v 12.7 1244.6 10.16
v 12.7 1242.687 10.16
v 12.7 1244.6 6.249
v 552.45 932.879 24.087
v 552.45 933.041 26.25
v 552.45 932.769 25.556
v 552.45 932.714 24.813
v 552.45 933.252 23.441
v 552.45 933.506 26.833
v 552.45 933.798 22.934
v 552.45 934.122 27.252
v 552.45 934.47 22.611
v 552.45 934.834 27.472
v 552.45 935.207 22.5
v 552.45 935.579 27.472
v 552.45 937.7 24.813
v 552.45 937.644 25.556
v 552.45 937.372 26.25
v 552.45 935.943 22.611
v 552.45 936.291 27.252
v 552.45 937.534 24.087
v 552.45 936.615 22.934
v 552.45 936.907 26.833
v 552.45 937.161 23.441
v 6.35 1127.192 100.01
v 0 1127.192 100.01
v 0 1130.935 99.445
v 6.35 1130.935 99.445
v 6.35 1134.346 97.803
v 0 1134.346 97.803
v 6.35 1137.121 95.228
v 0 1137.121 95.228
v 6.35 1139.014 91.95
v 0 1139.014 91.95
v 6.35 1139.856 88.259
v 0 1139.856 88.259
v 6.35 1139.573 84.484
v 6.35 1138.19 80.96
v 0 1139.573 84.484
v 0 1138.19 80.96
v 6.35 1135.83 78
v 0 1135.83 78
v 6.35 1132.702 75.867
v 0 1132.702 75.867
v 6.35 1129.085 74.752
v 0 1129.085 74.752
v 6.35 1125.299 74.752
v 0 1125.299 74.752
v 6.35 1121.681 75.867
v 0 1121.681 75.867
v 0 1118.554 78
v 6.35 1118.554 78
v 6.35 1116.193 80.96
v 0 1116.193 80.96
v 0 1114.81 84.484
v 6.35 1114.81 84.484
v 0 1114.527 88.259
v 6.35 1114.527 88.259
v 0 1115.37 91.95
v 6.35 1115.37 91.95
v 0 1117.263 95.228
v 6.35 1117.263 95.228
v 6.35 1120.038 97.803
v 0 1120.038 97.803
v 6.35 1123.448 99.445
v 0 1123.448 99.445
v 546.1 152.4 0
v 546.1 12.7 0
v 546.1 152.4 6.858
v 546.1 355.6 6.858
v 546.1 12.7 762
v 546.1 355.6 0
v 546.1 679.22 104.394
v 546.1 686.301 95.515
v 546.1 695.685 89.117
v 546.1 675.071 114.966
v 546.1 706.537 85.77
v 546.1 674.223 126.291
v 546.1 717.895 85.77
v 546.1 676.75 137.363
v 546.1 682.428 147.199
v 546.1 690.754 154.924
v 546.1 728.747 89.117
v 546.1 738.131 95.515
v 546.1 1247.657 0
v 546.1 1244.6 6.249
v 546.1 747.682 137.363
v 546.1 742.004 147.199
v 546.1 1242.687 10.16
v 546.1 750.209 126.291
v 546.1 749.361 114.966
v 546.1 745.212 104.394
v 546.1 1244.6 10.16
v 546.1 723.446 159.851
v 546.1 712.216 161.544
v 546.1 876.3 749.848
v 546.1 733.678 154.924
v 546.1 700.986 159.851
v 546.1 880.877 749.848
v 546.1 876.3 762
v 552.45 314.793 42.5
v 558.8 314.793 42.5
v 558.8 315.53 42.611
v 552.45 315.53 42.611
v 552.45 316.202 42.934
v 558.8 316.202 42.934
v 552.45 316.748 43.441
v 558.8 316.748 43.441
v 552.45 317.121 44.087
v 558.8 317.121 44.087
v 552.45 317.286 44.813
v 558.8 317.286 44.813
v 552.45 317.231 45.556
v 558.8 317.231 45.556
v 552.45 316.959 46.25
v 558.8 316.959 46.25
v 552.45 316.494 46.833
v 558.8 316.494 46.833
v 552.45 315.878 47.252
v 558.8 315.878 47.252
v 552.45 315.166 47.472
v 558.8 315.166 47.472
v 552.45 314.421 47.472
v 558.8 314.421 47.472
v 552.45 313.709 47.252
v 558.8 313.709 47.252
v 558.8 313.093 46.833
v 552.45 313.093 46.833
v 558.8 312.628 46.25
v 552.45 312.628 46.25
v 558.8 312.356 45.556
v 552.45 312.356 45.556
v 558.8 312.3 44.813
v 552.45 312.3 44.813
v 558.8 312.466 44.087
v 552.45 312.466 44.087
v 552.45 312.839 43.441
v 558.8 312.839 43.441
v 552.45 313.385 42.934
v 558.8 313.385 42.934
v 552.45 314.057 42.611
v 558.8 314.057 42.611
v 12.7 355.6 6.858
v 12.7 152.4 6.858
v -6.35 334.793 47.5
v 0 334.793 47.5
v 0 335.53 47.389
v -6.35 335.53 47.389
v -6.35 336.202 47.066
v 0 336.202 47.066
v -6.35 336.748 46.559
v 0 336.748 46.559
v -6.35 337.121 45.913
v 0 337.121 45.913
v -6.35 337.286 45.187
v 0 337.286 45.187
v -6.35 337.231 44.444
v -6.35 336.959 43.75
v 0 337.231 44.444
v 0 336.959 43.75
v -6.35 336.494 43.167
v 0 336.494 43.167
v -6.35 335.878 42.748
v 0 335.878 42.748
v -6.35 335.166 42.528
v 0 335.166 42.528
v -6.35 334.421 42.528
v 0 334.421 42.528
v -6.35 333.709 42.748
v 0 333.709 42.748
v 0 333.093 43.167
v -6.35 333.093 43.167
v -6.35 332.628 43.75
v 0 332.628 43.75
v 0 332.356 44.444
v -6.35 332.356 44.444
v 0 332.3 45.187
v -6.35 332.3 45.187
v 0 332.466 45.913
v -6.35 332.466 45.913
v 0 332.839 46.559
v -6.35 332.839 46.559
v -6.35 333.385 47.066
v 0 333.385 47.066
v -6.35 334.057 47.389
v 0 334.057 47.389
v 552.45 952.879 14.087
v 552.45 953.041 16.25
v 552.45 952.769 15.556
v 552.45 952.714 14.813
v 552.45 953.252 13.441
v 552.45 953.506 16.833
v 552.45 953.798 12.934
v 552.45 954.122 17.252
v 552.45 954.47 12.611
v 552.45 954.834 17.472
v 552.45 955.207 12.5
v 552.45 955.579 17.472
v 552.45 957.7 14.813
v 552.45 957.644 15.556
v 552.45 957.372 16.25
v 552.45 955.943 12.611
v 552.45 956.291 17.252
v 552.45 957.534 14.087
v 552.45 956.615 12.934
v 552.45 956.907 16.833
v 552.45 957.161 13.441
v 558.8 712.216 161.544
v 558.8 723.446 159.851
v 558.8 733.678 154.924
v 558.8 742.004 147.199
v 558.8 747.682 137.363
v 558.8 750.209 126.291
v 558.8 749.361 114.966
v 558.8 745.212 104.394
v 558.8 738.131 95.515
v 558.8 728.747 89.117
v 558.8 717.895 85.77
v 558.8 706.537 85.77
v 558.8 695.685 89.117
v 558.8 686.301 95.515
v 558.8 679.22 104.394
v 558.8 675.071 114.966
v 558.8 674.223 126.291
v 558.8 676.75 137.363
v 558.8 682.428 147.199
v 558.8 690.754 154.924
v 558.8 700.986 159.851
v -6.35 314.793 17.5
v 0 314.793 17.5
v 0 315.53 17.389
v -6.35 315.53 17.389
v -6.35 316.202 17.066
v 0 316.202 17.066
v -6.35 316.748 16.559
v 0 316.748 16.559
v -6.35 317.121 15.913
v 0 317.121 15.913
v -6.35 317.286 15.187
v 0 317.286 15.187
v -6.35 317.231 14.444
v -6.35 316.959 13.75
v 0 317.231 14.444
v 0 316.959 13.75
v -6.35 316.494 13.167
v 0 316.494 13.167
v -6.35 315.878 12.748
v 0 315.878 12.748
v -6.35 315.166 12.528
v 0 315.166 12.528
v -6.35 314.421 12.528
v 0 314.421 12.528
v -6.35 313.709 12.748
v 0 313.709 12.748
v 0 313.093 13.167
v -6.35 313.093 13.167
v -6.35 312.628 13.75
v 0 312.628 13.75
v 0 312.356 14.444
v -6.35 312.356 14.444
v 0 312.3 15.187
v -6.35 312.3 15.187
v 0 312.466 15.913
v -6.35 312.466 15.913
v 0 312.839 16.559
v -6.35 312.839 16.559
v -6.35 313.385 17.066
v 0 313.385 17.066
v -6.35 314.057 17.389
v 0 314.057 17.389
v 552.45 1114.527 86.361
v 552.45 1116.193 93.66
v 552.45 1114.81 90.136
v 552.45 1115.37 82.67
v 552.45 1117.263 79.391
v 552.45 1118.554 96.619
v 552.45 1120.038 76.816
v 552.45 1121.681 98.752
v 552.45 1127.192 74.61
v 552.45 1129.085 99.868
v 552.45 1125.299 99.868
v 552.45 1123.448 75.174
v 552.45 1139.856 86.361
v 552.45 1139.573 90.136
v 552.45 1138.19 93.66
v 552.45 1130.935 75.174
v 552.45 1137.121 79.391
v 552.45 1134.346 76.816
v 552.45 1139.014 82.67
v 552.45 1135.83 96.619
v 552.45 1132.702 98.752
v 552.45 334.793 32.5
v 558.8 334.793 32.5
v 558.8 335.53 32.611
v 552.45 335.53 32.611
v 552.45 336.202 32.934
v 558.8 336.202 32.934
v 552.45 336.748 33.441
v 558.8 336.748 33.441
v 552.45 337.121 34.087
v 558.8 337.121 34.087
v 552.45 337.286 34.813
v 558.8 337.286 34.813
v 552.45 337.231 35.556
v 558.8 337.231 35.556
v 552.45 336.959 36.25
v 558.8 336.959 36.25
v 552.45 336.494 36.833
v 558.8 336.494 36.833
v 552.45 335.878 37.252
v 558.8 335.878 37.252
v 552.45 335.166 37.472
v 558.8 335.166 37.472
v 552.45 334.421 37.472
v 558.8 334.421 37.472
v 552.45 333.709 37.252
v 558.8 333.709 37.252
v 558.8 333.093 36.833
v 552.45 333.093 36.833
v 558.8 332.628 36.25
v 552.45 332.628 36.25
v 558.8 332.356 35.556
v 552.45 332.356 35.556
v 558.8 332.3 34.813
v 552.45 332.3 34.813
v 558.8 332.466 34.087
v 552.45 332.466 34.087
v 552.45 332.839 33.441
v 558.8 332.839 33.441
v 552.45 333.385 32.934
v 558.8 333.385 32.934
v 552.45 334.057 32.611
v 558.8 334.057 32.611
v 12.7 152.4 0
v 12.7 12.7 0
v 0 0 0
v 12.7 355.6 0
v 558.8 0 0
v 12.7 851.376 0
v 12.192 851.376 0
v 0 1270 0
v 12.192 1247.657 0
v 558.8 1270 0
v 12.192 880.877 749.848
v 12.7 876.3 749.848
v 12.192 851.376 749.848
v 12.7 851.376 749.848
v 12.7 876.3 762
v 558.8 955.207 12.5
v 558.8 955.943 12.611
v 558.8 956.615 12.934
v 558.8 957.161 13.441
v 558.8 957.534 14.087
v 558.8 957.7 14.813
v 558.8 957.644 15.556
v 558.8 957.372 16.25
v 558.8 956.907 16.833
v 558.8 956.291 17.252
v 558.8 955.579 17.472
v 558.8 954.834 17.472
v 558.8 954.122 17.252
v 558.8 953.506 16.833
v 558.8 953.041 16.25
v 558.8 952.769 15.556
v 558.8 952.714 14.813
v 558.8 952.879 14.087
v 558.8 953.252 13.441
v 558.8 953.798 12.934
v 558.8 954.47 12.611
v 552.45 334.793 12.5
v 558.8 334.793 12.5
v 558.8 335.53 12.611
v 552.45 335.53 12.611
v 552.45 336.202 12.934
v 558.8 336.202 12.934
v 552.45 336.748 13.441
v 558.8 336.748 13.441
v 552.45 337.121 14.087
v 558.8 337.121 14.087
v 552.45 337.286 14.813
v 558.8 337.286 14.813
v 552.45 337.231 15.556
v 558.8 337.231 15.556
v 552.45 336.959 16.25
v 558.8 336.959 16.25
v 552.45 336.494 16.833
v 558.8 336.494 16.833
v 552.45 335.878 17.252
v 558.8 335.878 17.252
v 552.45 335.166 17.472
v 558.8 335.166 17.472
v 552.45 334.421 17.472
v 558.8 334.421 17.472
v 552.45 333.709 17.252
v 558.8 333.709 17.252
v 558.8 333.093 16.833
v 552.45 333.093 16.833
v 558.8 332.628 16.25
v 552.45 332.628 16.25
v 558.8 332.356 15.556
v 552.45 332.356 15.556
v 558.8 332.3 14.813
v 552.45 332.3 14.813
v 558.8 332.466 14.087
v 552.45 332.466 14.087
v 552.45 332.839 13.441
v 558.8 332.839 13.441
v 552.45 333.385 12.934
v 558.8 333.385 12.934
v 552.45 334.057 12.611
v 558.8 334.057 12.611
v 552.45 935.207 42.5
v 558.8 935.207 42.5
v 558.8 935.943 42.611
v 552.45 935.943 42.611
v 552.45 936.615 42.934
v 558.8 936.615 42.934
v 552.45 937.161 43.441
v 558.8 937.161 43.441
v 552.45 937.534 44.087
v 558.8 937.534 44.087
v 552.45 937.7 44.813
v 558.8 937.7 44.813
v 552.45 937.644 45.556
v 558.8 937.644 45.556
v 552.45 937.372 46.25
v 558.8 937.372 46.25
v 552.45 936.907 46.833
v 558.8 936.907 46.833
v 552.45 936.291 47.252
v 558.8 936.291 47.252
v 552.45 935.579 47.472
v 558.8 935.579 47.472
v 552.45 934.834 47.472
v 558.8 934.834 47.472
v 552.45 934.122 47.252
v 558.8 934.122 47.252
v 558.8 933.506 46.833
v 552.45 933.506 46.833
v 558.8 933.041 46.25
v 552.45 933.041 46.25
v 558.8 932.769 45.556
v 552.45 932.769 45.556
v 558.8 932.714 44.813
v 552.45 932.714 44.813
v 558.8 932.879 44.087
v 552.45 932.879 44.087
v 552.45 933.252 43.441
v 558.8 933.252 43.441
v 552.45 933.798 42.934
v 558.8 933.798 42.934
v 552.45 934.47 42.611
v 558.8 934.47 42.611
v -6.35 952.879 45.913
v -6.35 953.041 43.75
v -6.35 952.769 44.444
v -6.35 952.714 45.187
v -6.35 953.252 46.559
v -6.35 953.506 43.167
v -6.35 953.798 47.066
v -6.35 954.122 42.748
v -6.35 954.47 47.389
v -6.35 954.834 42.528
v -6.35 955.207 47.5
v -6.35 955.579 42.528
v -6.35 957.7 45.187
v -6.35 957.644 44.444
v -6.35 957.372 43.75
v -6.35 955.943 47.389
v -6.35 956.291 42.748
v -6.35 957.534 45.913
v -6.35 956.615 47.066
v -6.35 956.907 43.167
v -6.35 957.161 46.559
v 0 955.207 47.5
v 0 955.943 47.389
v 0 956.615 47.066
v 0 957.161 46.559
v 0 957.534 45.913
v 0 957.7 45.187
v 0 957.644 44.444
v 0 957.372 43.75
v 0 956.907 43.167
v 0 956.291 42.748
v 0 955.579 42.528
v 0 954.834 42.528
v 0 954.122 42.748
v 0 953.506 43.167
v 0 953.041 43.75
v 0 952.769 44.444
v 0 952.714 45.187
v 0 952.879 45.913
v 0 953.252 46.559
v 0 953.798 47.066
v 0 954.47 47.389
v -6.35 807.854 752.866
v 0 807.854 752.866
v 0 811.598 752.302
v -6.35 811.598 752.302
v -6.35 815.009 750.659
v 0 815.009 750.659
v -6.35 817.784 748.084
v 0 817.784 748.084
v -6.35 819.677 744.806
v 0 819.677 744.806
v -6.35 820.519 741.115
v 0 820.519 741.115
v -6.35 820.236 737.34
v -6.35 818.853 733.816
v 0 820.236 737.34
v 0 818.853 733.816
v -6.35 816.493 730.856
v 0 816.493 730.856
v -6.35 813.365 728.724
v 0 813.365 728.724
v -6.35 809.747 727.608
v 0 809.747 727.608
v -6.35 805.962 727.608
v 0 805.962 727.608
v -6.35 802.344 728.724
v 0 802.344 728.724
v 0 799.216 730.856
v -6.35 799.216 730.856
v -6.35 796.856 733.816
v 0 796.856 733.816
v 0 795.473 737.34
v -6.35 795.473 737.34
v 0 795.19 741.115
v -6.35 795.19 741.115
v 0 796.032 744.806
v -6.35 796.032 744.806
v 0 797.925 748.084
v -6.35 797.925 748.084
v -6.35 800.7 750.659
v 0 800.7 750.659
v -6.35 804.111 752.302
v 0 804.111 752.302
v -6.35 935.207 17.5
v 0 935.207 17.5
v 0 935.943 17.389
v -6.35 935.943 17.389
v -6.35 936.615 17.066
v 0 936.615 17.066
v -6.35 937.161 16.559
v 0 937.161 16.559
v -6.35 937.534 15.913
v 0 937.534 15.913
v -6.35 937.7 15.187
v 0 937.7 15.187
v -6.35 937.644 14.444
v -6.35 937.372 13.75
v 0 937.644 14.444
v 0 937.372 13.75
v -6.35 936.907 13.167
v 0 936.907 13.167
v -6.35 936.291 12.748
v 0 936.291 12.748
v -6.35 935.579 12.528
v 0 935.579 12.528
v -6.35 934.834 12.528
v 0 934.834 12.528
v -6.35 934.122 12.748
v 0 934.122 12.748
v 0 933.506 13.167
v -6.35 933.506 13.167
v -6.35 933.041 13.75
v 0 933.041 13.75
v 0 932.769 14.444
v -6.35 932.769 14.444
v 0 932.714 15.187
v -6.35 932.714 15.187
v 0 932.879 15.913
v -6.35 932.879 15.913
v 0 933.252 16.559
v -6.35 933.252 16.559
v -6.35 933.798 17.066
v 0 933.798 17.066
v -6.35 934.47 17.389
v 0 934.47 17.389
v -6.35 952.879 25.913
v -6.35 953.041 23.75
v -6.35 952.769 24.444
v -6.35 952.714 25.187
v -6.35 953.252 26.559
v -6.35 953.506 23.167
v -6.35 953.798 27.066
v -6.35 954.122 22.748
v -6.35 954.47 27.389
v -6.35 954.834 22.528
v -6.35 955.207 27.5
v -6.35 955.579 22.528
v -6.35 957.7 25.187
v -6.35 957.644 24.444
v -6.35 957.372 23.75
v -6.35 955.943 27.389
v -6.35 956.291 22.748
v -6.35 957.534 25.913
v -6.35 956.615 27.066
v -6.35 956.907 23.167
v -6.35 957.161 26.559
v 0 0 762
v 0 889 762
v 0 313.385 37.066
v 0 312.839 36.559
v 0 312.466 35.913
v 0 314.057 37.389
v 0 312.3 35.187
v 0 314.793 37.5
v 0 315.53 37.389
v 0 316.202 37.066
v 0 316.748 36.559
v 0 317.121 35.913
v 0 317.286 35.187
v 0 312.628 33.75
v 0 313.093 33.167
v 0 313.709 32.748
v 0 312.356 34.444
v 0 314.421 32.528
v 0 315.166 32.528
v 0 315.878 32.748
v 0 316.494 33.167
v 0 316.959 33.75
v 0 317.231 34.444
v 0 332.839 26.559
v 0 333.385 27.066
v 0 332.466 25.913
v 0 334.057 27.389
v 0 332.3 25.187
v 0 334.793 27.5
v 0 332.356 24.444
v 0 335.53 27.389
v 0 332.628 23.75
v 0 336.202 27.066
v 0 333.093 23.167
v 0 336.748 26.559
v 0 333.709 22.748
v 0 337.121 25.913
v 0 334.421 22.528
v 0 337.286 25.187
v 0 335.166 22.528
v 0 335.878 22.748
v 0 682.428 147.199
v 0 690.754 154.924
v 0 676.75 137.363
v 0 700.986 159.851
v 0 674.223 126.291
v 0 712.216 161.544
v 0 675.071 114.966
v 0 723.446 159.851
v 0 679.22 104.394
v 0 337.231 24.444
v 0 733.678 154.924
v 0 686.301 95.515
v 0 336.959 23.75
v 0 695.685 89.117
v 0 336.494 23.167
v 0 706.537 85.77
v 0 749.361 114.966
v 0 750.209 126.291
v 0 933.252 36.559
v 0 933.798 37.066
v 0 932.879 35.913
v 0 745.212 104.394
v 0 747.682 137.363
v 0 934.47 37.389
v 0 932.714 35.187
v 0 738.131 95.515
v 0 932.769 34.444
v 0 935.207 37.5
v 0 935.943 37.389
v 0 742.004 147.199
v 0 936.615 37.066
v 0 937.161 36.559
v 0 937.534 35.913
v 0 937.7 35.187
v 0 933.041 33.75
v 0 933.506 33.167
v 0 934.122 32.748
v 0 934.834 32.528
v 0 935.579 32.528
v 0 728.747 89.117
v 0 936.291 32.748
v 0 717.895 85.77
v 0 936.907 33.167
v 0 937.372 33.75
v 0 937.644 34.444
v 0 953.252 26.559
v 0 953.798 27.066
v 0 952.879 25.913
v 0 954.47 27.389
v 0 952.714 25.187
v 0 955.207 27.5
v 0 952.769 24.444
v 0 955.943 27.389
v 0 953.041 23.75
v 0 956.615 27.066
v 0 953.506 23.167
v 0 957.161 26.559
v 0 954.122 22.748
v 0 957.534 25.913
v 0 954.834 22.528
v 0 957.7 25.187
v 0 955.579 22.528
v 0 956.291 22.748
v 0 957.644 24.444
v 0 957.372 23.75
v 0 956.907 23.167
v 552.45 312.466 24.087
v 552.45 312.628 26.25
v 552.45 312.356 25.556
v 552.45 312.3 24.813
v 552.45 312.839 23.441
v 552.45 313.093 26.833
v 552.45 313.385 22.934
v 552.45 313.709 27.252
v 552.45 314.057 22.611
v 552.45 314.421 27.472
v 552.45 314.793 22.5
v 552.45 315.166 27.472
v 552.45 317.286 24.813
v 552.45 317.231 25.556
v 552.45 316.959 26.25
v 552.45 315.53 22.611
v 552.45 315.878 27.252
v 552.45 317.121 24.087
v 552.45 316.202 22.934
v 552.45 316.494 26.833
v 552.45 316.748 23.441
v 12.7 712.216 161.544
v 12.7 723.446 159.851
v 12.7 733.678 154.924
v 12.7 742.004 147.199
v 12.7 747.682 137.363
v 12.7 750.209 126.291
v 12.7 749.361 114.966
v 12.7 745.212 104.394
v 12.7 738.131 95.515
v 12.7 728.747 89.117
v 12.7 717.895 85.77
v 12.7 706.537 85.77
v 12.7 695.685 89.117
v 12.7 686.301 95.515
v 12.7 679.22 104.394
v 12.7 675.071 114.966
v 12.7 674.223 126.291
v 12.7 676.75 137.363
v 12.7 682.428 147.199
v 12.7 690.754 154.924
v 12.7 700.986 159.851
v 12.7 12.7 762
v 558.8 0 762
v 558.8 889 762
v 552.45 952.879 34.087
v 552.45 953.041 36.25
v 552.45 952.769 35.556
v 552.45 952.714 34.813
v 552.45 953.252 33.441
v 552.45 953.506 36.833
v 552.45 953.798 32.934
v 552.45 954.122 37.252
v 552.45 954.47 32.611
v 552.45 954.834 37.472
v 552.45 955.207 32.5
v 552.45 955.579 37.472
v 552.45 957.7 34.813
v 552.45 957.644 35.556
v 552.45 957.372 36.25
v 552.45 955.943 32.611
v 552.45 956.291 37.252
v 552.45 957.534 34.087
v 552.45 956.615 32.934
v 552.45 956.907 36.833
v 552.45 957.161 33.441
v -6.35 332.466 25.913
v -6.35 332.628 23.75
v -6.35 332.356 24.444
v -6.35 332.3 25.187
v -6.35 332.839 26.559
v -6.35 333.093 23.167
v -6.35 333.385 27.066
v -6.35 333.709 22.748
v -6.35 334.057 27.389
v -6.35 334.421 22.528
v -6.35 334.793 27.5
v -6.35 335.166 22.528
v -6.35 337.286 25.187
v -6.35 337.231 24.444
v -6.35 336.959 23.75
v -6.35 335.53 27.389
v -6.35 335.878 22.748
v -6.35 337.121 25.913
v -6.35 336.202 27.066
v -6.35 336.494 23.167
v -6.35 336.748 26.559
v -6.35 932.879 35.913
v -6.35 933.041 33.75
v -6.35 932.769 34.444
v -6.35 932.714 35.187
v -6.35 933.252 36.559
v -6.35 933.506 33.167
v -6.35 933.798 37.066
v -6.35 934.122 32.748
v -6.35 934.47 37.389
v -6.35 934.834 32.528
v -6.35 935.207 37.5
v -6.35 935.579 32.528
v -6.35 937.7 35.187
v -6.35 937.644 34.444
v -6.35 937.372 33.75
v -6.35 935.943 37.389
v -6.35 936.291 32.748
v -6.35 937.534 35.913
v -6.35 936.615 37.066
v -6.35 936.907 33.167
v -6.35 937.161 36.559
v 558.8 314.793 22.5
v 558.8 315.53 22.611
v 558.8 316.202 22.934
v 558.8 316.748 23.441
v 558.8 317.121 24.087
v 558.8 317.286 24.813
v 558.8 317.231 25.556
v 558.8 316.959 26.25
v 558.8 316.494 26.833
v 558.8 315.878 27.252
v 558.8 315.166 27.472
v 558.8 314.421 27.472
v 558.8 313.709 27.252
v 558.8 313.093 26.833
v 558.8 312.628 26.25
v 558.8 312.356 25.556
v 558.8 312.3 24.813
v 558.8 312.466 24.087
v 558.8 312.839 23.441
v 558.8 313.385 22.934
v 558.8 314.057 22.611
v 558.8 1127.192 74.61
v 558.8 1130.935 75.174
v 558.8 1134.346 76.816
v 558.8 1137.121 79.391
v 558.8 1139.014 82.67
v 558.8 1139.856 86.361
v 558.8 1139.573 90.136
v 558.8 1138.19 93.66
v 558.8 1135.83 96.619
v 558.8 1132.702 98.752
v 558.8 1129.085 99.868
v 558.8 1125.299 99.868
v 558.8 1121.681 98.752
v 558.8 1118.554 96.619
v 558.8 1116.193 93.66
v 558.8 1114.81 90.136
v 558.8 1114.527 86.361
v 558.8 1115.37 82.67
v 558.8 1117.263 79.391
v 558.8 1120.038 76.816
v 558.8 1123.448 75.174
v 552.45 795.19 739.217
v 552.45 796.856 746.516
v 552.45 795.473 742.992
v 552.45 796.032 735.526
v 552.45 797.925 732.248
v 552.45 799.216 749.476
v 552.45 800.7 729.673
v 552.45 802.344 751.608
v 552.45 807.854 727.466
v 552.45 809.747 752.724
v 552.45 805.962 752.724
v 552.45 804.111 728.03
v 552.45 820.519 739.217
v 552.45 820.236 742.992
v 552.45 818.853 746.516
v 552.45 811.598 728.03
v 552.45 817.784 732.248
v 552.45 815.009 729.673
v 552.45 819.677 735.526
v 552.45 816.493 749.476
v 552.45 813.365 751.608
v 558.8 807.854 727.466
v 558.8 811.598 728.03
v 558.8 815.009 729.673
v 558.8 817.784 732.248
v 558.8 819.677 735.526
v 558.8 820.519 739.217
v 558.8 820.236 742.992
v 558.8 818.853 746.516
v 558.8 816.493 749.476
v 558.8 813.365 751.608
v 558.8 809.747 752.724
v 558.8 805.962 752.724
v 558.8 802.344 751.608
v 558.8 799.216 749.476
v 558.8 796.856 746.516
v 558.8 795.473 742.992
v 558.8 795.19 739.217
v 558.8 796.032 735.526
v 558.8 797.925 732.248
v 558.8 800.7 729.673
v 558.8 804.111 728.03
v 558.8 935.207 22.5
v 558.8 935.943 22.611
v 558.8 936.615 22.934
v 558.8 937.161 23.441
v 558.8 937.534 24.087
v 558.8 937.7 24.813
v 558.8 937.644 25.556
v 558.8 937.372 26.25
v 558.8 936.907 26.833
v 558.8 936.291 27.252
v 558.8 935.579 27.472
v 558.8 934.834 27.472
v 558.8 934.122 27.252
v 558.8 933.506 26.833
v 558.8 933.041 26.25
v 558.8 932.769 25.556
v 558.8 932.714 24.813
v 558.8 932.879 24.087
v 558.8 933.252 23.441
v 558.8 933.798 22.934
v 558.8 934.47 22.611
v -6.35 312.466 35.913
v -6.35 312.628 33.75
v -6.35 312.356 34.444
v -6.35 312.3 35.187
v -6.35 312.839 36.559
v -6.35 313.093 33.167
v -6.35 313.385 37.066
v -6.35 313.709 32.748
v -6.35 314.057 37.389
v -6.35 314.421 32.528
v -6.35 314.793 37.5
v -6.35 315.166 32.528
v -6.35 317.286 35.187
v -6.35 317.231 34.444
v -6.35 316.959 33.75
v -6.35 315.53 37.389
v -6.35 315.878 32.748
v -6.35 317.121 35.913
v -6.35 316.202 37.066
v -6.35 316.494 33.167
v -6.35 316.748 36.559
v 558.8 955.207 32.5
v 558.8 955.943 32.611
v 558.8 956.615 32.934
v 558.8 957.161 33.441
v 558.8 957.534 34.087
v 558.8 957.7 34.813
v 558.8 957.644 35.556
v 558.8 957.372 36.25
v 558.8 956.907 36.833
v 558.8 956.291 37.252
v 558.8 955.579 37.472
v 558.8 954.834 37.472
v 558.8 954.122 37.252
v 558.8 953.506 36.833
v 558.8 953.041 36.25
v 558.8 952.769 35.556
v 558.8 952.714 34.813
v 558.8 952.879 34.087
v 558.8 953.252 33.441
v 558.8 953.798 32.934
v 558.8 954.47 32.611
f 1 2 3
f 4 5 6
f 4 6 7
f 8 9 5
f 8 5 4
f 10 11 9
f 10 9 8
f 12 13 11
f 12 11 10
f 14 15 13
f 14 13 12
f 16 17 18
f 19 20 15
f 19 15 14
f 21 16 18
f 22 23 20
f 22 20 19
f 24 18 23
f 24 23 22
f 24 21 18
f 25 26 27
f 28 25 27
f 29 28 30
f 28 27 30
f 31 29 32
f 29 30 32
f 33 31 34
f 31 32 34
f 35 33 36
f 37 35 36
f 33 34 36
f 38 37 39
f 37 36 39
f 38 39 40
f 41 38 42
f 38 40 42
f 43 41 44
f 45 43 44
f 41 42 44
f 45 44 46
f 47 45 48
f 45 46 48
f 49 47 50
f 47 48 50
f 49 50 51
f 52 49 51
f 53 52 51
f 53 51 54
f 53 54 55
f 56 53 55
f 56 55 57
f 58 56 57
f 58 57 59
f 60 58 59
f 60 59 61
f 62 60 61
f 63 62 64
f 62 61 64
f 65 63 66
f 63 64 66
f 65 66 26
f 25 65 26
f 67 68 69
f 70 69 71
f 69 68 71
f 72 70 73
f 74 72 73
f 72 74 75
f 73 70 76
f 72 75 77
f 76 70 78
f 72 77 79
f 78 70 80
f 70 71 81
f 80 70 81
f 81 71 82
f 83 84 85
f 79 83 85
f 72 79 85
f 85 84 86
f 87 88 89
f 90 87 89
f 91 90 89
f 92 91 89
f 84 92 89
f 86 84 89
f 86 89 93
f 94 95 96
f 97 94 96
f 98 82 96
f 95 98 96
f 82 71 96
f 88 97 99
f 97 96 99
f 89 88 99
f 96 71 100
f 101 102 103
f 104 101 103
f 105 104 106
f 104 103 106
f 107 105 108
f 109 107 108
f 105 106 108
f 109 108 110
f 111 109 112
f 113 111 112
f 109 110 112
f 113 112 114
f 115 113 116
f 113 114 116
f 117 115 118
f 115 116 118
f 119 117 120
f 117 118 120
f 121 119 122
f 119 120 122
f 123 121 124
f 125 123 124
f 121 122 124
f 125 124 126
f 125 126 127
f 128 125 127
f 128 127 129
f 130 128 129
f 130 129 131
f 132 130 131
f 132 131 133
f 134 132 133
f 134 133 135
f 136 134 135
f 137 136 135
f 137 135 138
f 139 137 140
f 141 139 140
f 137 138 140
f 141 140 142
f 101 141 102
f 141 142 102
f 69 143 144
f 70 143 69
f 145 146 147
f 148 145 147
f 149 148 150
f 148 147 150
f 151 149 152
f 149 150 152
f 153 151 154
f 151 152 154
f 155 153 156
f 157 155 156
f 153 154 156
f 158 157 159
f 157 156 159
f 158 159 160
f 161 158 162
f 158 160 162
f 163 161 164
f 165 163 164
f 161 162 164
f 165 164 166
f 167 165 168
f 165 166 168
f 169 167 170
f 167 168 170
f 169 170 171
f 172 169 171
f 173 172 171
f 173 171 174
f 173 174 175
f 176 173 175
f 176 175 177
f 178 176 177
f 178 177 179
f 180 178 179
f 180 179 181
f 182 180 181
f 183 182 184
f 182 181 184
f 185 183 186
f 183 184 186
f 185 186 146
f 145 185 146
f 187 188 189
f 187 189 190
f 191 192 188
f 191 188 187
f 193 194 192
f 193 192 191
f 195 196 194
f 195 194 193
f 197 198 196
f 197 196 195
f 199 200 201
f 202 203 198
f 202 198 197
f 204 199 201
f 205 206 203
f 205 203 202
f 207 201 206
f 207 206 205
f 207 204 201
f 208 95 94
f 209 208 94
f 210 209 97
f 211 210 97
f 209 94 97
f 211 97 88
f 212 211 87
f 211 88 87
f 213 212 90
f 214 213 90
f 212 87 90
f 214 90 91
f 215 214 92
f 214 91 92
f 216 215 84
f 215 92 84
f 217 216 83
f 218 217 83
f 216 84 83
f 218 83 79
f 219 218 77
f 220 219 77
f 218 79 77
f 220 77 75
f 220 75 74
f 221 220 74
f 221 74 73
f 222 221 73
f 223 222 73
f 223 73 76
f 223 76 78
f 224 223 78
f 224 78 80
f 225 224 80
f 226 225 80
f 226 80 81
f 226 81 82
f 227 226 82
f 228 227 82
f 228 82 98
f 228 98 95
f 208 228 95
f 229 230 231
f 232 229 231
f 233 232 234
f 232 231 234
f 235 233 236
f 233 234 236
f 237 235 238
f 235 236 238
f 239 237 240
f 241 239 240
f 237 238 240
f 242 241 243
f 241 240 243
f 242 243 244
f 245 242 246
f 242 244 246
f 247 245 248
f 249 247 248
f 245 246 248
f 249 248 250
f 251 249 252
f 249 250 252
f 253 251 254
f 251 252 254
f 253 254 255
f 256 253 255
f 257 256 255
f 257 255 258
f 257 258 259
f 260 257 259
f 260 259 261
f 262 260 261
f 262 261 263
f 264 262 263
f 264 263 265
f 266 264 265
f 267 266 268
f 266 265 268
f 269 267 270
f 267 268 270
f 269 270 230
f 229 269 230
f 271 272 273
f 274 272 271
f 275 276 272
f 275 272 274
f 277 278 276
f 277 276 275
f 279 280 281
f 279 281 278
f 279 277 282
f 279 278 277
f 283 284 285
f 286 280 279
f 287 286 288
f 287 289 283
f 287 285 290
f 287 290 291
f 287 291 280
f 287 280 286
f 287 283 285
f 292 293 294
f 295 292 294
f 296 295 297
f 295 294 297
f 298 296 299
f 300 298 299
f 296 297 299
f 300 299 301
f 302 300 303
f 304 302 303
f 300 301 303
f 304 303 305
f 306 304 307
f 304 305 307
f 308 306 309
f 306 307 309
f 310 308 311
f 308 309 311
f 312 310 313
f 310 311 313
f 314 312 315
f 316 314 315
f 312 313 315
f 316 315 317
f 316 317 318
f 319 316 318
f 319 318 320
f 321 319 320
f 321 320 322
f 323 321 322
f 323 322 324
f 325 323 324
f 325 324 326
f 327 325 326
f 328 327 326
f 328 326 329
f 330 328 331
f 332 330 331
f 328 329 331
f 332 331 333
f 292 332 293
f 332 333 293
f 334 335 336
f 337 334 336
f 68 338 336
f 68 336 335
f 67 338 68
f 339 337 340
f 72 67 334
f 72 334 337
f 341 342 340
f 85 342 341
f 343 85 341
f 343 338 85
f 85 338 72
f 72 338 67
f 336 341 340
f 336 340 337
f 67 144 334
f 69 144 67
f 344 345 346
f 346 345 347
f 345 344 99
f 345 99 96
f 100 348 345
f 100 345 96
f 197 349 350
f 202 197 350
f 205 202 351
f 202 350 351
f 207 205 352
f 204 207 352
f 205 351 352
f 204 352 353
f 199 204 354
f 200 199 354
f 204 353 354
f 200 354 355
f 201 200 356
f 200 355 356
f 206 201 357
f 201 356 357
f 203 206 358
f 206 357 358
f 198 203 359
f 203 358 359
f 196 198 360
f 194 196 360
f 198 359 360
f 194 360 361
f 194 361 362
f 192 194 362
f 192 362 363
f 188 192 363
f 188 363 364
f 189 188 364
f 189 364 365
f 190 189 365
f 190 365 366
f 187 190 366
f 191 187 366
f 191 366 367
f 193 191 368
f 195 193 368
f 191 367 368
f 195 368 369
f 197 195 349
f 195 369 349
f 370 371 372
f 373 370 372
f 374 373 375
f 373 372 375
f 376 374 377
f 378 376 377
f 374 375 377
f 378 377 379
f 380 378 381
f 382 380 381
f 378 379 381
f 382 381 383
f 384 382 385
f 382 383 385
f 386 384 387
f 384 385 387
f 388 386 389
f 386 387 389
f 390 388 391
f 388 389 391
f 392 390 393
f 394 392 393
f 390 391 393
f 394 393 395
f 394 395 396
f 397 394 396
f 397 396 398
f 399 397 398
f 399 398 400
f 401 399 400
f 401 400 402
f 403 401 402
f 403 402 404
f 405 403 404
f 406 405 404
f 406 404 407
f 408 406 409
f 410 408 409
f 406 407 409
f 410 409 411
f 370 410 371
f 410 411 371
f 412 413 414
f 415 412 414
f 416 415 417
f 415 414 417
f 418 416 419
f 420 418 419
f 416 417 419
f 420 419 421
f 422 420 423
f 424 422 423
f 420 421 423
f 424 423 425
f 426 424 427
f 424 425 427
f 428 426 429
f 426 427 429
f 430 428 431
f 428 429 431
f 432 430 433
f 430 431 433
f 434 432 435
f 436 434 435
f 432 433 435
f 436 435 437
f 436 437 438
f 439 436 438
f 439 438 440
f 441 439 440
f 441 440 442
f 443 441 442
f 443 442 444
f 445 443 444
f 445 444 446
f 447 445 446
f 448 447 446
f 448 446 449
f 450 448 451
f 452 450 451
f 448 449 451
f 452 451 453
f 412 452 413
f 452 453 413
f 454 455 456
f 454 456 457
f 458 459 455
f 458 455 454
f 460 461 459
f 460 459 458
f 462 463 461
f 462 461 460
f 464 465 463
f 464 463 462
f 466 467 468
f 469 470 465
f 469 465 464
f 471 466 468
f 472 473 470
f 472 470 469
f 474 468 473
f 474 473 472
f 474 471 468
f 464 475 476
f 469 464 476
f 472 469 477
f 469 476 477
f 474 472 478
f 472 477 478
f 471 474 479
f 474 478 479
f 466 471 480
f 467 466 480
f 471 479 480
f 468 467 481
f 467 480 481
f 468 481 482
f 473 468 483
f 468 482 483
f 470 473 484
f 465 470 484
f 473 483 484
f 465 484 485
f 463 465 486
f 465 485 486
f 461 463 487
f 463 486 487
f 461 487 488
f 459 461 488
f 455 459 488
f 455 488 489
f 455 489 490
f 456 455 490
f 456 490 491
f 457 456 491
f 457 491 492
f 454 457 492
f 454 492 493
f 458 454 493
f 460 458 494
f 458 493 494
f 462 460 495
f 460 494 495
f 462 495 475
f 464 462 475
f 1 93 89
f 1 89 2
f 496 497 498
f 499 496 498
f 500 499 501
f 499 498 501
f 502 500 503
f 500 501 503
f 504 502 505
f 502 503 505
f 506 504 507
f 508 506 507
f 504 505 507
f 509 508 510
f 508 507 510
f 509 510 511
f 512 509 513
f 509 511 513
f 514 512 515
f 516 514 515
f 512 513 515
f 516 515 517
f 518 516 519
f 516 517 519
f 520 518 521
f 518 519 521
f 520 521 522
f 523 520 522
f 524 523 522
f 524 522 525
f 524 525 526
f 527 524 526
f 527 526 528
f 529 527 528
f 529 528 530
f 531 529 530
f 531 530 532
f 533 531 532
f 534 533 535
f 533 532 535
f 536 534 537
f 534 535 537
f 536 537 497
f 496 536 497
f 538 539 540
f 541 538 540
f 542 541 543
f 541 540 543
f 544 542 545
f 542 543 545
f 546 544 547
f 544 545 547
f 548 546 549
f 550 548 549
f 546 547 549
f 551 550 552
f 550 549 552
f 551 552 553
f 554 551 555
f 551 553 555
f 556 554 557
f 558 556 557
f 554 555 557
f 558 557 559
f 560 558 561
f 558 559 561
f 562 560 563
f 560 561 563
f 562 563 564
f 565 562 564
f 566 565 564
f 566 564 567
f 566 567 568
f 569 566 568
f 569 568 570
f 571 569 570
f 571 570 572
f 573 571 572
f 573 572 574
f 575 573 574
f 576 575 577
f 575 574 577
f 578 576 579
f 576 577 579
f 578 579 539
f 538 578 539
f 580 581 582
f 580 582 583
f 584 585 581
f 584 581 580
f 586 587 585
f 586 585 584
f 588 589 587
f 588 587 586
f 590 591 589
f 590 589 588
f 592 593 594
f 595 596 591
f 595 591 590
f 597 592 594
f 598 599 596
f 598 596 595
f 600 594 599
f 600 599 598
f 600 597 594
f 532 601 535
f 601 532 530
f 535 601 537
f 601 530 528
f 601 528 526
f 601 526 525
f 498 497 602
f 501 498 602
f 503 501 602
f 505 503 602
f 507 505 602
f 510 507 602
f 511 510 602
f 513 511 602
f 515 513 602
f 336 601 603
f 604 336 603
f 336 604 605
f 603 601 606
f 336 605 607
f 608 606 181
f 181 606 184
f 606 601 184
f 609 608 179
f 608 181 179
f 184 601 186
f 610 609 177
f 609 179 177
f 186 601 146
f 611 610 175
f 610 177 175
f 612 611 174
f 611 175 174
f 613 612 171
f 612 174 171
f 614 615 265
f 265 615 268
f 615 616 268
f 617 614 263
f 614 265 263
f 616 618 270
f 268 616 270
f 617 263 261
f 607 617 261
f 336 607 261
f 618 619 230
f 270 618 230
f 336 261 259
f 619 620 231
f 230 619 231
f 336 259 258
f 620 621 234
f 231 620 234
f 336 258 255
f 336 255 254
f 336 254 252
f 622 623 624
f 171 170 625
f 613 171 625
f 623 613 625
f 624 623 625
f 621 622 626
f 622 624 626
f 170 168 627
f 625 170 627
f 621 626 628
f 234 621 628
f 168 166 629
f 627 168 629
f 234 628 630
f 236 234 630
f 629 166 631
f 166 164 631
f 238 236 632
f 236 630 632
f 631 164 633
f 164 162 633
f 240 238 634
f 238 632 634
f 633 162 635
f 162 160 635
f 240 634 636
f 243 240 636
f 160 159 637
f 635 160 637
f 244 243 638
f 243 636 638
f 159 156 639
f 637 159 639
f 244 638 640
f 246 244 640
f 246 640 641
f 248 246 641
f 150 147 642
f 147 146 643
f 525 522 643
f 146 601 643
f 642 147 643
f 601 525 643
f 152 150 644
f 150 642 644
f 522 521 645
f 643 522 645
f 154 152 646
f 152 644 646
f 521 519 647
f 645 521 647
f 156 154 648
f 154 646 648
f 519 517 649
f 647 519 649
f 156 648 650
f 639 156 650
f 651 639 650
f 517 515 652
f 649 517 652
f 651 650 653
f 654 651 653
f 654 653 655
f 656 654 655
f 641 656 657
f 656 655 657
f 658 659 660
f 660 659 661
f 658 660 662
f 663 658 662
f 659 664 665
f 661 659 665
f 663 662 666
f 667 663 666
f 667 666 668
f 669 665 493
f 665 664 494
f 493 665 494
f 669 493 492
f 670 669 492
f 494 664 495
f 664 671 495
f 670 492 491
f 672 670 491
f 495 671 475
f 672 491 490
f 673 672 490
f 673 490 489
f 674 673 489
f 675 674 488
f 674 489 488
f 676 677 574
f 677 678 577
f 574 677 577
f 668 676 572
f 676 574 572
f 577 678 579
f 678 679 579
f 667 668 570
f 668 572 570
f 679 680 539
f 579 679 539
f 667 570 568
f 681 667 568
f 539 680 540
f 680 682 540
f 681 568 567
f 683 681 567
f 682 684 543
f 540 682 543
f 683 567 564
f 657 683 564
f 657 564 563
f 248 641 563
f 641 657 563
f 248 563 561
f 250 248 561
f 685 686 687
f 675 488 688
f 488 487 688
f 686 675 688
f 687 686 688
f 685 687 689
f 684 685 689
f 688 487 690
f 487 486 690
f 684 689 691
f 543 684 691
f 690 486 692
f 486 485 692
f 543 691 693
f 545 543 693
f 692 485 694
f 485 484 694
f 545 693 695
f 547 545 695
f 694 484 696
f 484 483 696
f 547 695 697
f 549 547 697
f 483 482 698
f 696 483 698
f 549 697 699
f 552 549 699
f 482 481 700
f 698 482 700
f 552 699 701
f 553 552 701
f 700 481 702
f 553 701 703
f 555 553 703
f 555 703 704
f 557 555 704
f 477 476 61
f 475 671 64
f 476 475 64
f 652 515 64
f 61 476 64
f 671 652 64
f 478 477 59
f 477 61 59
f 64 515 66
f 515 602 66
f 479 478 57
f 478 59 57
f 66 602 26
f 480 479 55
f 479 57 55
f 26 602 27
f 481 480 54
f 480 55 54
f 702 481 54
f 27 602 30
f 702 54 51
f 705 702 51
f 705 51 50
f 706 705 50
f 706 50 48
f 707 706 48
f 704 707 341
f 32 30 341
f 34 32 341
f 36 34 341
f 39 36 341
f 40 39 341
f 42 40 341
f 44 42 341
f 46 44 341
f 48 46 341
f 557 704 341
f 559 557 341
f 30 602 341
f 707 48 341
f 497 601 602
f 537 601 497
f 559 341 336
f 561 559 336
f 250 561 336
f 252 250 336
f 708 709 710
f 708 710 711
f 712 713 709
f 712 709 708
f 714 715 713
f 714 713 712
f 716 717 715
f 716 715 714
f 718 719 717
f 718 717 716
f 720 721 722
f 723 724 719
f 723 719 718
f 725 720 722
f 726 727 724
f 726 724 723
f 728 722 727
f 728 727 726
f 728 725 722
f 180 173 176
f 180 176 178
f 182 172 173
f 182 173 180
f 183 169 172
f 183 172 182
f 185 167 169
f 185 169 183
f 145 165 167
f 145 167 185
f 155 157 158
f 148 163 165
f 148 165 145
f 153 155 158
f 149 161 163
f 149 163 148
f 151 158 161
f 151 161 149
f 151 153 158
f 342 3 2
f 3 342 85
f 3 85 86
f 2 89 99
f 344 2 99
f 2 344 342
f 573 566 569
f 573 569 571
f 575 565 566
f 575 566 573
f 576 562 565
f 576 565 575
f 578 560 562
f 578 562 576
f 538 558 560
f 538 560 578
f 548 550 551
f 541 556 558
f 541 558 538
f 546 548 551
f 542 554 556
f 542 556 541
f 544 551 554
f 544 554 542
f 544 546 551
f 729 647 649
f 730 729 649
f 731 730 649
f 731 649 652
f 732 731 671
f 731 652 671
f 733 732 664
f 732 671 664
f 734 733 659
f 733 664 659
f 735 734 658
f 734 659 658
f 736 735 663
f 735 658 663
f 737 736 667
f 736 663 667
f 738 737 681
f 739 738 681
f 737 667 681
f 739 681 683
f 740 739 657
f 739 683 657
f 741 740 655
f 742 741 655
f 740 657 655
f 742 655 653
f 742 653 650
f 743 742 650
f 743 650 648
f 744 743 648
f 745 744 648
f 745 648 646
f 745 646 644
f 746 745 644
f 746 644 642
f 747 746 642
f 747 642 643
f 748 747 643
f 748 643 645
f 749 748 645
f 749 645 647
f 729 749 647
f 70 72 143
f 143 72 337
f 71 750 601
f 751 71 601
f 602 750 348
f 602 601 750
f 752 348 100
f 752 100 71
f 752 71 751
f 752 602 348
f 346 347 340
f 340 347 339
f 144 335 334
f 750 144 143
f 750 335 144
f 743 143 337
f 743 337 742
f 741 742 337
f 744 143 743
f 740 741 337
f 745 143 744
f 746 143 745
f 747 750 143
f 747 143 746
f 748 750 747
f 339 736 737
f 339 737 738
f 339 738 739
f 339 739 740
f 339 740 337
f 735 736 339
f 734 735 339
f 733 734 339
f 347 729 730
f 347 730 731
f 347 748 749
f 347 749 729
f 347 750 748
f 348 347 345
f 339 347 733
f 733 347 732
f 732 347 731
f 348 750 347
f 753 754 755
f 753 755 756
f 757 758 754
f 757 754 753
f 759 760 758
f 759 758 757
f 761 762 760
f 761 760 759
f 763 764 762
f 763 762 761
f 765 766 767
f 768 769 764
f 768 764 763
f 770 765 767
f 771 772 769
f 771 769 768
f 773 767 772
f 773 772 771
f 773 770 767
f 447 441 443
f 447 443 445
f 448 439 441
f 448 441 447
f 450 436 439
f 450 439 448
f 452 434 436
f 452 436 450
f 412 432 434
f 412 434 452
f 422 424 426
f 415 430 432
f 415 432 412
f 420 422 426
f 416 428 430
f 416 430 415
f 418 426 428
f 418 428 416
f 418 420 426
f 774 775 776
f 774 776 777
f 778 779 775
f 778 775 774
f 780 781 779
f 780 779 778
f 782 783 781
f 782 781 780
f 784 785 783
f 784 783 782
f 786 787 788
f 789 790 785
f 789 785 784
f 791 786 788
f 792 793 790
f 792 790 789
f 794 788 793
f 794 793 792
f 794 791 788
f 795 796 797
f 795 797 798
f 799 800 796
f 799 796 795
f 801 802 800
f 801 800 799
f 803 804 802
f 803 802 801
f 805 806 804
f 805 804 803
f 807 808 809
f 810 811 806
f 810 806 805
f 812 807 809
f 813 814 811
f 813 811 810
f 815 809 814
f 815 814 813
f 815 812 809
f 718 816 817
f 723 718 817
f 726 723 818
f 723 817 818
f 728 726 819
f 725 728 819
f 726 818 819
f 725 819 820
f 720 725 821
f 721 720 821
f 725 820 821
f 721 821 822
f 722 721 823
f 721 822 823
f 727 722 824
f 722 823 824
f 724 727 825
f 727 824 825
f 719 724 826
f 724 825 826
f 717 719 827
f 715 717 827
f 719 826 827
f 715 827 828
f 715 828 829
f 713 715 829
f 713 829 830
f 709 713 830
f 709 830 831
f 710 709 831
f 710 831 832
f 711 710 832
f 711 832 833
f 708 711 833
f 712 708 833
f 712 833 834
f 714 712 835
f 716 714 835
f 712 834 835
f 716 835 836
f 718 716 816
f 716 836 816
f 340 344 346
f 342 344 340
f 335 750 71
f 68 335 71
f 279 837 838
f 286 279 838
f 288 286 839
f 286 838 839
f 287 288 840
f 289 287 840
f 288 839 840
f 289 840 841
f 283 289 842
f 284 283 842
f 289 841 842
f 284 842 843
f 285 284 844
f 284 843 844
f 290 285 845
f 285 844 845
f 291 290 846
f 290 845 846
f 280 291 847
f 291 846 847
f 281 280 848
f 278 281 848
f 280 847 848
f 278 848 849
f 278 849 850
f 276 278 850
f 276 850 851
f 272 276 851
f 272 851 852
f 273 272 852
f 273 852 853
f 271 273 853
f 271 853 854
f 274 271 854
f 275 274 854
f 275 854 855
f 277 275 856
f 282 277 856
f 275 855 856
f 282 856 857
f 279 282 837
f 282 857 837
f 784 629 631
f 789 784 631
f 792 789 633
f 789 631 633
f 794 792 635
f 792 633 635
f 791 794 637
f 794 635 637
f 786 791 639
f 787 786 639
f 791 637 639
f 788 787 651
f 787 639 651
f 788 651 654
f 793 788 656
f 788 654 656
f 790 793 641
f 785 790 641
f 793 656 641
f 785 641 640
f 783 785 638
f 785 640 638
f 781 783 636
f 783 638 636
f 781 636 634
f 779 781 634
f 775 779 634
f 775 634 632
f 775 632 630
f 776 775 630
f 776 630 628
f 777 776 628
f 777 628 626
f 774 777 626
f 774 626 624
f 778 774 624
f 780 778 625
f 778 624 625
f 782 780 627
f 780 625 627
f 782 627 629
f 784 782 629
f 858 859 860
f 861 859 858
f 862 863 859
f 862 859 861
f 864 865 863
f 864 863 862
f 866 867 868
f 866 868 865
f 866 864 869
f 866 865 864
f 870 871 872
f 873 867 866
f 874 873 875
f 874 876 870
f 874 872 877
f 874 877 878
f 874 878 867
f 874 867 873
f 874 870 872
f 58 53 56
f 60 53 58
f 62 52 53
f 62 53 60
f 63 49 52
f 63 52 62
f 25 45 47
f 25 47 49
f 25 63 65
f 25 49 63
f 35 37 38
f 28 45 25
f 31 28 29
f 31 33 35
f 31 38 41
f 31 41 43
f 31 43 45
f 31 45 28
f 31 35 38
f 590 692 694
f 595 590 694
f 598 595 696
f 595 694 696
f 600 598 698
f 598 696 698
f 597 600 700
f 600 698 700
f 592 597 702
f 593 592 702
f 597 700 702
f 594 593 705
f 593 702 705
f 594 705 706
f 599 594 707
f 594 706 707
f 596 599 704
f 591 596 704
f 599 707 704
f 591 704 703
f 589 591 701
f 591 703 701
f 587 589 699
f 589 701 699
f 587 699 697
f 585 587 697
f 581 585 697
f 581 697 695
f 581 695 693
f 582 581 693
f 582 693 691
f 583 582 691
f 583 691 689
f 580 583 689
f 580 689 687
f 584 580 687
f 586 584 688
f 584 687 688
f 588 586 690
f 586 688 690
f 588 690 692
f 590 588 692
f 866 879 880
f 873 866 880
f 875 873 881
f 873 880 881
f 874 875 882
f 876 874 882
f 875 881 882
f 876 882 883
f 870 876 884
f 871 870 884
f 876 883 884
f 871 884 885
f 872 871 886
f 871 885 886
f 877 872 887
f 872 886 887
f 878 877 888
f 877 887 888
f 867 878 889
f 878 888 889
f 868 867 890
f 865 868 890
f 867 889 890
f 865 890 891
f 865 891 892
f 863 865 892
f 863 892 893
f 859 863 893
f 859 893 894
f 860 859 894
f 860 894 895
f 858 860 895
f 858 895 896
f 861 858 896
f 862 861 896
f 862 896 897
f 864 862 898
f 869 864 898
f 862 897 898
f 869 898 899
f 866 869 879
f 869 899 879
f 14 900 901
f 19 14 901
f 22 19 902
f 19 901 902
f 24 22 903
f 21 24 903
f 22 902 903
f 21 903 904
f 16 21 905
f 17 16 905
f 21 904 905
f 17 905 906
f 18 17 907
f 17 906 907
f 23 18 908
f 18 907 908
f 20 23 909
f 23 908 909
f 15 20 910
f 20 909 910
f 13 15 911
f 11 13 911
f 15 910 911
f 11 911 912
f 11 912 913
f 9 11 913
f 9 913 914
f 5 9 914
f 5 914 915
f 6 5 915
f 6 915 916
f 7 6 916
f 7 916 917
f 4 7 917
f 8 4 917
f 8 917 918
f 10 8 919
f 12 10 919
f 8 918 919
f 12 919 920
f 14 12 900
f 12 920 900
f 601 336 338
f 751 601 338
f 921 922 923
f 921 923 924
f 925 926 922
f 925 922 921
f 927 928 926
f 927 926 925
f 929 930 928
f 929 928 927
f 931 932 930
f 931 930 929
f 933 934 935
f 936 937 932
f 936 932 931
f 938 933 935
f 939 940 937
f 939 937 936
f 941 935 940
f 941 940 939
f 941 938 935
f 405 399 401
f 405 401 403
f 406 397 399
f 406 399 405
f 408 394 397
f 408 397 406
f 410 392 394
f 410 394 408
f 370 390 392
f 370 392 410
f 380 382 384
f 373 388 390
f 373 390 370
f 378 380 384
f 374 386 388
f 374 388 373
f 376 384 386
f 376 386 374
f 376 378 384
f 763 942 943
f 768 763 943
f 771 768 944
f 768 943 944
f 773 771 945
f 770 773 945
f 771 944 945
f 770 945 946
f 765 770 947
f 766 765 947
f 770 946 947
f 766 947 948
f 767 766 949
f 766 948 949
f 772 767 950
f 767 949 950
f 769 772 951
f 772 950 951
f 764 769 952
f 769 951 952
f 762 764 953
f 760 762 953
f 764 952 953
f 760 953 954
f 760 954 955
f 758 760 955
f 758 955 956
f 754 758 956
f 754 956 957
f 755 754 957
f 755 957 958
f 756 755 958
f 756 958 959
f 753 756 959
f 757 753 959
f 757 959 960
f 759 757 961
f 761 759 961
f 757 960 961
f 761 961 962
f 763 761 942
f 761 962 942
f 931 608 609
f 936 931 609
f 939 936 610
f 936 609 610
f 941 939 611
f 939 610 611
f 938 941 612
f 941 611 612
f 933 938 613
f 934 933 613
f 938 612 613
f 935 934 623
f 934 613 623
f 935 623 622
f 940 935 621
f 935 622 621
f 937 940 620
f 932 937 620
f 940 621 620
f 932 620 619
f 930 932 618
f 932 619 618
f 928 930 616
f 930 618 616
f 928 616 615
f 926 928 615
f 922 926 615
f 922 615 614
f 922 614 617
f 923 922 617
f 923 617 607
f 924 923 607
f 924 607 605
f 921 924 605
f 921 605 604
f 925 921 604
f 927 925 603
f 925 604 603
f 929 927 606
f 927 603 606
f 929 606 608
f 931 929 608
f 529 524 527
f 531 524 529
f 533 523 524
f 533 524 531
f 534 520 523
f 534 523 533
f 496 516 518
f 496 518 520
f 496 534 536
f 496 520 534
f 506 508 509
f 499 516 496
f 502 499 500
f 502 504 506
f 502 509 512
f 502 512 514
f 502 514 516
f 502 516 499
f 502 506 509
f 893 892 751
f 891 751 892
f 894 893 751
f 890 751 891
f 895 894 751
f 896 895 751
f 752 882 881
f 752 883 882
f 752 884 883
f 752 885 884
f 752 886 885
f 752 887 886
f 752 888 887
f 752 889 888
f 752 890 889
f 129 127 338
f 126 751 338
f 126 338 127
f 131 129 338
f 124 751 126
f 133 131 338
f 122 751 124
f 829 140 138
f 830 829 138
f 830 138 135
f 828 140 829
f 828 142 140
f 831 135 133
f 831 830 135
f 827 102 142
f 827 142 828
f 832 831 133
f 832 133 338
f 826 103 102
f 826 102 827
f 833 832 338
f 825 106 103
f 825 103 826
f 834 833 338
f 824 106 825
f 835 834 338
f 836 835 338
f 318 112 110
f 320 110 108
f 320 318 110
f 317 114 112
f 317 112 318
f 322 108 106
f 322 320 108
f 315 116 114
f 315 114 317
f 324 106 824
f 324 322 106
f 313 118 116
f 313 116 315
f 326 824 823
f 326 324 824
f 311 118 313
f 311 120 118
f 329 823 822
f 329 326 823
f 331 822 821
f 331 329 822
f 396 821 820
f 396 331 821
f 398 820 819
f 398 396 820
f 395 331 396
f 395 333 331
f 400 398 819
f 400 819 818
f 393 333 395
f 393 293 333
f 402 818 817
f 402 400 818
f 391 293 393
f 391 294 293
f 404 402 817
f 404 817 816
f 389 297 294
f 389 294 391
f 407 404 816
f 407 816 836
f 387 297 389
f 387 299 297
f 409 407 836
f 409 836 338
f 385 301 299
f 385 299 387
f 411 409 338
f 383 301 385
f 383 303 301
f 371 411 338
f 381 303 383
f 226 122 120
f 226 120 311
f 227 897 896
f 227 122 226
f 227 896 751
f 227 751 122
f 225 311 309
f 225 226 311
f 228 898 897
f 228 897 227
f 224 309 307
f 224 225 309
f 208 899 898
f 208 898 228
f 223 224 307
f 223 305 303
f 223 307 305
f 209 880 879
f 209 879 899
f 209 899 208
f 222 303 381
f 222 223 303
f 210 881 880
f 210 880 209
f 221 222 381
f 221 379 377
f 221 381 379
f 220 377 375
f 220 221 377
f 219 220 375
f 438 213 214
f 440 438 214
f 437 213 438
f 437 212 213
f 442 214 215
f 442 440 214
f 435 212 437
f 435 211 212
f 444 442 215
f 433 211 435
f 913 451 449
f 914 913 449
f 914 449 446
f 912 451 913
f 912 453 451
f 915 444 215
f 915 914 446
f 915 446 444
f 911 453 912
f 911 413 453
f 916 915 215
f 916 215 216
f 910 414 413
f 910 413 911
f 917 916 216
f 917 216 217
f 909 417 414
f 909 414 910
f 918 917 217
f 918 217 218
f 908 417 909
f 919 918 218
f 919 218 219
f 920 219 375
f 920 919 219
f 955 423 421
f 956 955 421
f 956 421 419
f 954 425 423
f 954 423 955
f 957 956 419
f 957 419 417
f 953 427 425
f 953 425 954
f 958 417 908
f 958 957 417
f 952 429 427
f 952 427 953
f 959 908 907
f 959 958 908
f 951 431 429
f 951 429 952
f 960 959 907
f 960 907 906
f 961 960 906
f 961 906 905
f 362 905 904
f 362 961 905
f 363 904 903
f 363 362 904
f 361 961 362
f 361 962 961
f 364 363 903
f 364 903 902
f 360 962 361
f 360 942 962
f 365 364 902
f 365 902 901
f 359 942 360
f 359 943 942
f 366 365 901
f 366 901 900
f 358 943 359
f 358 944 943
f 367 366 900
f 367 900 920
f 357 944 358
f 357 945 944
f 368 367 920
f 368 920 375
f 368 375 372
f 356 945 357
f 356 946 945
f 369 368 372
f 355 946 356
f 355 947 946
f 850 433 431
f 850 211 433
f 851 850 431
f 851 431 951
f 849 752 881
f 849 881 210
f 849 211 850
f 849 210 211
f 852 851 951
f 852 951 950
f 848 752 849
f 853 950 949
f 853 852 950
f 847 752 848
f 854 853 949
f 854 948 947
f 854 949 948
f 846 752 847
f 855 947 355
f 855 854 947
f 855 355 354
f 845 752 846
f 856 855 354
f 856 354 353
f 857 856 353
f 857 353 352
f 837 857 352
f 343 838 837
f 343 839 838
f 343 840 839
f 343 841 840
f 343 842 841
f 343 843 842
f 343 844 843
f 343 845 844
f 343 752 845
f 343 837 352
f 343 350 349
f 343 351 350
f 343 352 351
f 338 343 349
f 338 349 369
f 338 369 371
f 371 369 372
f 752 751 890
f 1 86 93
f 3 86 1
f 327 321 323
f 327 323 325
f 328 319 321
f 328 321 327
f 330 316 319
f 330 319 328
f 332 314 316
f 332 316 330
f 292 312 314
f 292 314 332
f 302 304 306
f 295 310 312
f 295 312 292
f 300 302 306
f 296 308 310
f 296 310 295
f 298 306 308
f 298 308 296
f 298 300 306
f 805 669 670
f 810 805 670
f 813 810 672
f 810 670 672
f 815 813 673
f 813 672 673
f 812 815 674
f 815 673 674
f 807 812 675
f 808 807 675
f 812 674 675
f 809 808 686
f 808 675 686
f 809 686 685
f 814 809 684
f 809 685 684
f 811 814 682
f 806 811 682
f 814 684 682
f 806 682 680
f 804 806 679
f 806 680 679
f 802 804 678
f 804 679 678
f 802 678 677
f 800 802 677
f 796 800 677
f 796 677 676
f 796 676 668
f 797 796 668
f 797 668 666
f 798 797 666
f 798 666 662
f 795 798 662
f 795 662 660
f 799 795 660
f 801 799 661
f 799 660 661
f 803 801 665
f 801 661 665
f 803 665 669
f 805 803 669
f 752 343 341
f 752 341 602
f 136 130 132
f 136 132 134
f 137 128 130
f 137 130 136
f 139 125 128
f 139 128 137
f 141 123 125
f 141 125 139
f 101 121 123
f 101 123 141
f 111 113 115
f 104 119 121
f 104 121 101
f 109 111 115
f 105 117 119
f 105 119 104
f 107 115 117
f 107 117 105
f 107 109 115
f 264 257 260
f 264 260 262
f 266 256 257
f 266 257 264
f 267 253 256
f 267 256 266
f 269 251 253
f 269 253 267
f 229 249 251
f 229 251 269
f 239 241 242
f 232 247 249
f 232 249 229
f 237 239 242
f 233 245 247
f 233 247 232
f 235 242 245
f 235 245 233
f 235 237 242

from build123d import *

# Parameters (mm, degrees)
SKETCH1_W           = 558.8
SKETCH1_H           = 889
BOSS_EXTRUDE1_DEPTH = 762
BOSS_EXTRUDE2_DEPTH = 558.8
SKETCH4_W           = 533.4
SKETCH4_H           = 127
CUT_EXTRUDE1_DEPTH  = 763
SKETCH5_W           = 533.4
SKETCH5_H           = 723.9
CUT_EXTRUDE3_DEPTH  = 755.142
SKETCH6_W           = 533.4
SKETCH6_H           = 889
CUT_EXTRUDE4_DEPTH  = 10.16
SKETCH7_R           = 38.1
CUT_EXTRUDE5_DEPTH  = 559.8
CUT_EXTRUDE6_DEPTH  = 533.908
CUT_EXTRUDE7_REACH  = 764
SKETCH12_W          = 533.4
SKETCH12_H          = 12.7
SKETCH13_R          = 2.5
SKETCH13_R_2        = 12.7
BOSS_EXTRUDE3_DEPTH = 6.35
SKETCH14_R          = 12.7
SKETCH14_R_2        = 2.5
CUT_EXTRUDE8_DEPTH  = 6.35
SKETCH15_R          = 12.7
CUT_EXTRUDE9_DEPTH  = 6.35


with BuildPart() as part:
    # Sketch1 → Boss-Extrude1 (new body)
    with BuildSketch(Plane.XY):
        with Locations((279.4, 444.5)):
            Rectangle(SKETCH1_W, SKETCH1_H)
    extrude(amount=BOSS_EXTRUDE1_DEPTH)

    # Sketch3 → Boss-Extrude2 (add)
    with BuildSketch(Plane(origin=(558.8, 0, 0), x_dir=(0, 0, -1), z_dir=(1, 0, 0))):
        Polygon((0, 889), (0, 1270), (-762, 889), align=None)
    extrude(amount=-BOSS_EXTRUDE2_DEPTH)

    # Sketch4 → Cut-Extrude1 (cut, through all)
    with BuildSketch(Plane.XY.offset(762)):
        with Locations((279.4, 76.2)):
            Rectangle(SKETCH4_W, SKETCH4_H)
    extrude(amount=-CUT_EXTRUDE1_DEPTH, mode=Mode.SUBTRACT)

    # Sketch5 → Cut-Extrude3 (cut)
    with BuildSketch(Plane.XY.offset(762)):
        with Locations((279.4, 514.35)):
            Rectangle(SKETCH5_W, SKETCH5_H)
    extrude(amount=-CUT_EXTRUDE3_DEPTH, mode=Mode.SUBTRACT)

    # Sketch6 → Cut-Extrude4 (cut)
    with BuildSketch(Plane(origin=(0, 0, 0), x_dir=(-1, 0, 0), z_dir=(0, 0, -1))):
        with Locations((-279.4, 800.1)):
            Rectangle(SKETCH6_W, SKETCH6_H)
    extrude(amount=-CUT_EXTRUDE4_DEPTH, mode=Mode.SUBTRACT)

    # Sketch7 → Cut-Extrude5 (cut, through all)
    with BuildSketch(Plane.ZY):
        with Locations((123.444, 712.216)):
            Circle(SKETCH7_R)
    extrude(amount=-CUT_EXTRUDE5_DEPTH, mode=Mode.SUBTRACT)

    # Sketch11 → Cut-Extrude6 (cut)
    with BuildSketch(Plane.ZY.offset(-546.1)):
        Polygon((0, 880.877149752), (0, 1247.656728703), (749.847637181, 880.877149752), (749.847637181, 851.37553613), (0, 851.37553613), align=None)
    extrude(amount=CUT_EXTRUDE6_DEPTH, mode=Mode.SUBTRACT)

    # Sketch12 → Cut-Extrude7 (cut, up to next)
    with BuildSketch(Plane.XY.offset(762), mode=Mode.PRIVATE) as cut_extrude7_sk1:
        with Locations((279.4, 146.05)):
            Rectangle(SKETCH12_W, SKETCH12_H)
    cut_extrude7_tool1 = extrude(cut_extrude7_sk1.sketch, amount=-CUT_EXTRUDE7_REACH, mode=Mode.PRIVATE) & part.part
    add(cut_extrude7_tool1.solids().sort_by_distance((279.4, 146.05, 762))[0], mode=Mode.SUBTRACT)

    # Sketch13 → Boss-Extrude3 (add)
    with BuildSketch(Plane.ZY):
        with Locations((45, 955.20656175)):
            Circle(SKETCH13_R)
        with Locations((25, 955.20656175)):
            Circle(SKETCH13_R)
        with Locations((35, 935.20656175)):
            Circle(SKETCH13_R)
        with Locations((15, 935.20656175)):
            Circle(SKETCH13_R)
        with Locations((740.165987986, 807.854465699)):
            Circle(SKETCH13_R_2)
        with Locations((35, 314.79343825)):
            Circle(SKETCH13_R)
        with Locations((45, 334.79343825)):
            Circle(SKETCH13_R)
        with Locations((25, 334.79343825)):
            Circle(SKETCH13_R)
        with Locations((15, 314.79343825)):
            Circle(SKETCH13_R)
    extrude(amount=BOSS_EXTRUDE3_DEPTH)

    # Sketch14 → Cut-Extrude8 (cut)
    with BuildSketch(Plane(origin=(558.8, 0, 0), x_dir=(0, 0, -1), z_dir=(1, 0, 0))):
        with Locations((-87.309700123, 1127.19181172)):
            Circle(SKETCH14_R)
        with Locations((-740.165987986, 807.854465699)):
            Circle(SKETCH14_R)
        with Locations((-25, 935.20656175)):
            Circle(SKETCH14_R_2)
        with Locations((-45, 935.20656175)):
            Circle(SKETCH14_R_2)
        with Locations((-35, 955.20656175)):
            Circle(SKETCH14_R_2)
        with Locations((-15, 955.20656175)):
            Circle(SKETCH14_R_2)
        with Locations((-25, 314.79343825)):
            Circle(SKETCH14_R_2)
        with Locations((-45, 314.79343825)):
            Circle(SKETCH14_R_2)
        with Locations((-35, 334.79343825)):
            Circle(SKETCH14_R_2)
        with Locations((-15, 334.79343825)):
            Circle(SKETCH14_R_2)
    extrude(amount=-CUT_EXTRUDE8_DEPTH, mode=Mode.SUBTRACT)

    # Sketch15 → Cut-Extrude9 (cut)
    with BuildSketch(Plane.ZY):
        with Locations((87.309700123, 1127.19181172)):
            Circle(SKETCH15_R)
    extrude(amount=-CUT_EXTRUDE9_DEPTH, mode=Mode.SUBTRACT)


solid = part.part
